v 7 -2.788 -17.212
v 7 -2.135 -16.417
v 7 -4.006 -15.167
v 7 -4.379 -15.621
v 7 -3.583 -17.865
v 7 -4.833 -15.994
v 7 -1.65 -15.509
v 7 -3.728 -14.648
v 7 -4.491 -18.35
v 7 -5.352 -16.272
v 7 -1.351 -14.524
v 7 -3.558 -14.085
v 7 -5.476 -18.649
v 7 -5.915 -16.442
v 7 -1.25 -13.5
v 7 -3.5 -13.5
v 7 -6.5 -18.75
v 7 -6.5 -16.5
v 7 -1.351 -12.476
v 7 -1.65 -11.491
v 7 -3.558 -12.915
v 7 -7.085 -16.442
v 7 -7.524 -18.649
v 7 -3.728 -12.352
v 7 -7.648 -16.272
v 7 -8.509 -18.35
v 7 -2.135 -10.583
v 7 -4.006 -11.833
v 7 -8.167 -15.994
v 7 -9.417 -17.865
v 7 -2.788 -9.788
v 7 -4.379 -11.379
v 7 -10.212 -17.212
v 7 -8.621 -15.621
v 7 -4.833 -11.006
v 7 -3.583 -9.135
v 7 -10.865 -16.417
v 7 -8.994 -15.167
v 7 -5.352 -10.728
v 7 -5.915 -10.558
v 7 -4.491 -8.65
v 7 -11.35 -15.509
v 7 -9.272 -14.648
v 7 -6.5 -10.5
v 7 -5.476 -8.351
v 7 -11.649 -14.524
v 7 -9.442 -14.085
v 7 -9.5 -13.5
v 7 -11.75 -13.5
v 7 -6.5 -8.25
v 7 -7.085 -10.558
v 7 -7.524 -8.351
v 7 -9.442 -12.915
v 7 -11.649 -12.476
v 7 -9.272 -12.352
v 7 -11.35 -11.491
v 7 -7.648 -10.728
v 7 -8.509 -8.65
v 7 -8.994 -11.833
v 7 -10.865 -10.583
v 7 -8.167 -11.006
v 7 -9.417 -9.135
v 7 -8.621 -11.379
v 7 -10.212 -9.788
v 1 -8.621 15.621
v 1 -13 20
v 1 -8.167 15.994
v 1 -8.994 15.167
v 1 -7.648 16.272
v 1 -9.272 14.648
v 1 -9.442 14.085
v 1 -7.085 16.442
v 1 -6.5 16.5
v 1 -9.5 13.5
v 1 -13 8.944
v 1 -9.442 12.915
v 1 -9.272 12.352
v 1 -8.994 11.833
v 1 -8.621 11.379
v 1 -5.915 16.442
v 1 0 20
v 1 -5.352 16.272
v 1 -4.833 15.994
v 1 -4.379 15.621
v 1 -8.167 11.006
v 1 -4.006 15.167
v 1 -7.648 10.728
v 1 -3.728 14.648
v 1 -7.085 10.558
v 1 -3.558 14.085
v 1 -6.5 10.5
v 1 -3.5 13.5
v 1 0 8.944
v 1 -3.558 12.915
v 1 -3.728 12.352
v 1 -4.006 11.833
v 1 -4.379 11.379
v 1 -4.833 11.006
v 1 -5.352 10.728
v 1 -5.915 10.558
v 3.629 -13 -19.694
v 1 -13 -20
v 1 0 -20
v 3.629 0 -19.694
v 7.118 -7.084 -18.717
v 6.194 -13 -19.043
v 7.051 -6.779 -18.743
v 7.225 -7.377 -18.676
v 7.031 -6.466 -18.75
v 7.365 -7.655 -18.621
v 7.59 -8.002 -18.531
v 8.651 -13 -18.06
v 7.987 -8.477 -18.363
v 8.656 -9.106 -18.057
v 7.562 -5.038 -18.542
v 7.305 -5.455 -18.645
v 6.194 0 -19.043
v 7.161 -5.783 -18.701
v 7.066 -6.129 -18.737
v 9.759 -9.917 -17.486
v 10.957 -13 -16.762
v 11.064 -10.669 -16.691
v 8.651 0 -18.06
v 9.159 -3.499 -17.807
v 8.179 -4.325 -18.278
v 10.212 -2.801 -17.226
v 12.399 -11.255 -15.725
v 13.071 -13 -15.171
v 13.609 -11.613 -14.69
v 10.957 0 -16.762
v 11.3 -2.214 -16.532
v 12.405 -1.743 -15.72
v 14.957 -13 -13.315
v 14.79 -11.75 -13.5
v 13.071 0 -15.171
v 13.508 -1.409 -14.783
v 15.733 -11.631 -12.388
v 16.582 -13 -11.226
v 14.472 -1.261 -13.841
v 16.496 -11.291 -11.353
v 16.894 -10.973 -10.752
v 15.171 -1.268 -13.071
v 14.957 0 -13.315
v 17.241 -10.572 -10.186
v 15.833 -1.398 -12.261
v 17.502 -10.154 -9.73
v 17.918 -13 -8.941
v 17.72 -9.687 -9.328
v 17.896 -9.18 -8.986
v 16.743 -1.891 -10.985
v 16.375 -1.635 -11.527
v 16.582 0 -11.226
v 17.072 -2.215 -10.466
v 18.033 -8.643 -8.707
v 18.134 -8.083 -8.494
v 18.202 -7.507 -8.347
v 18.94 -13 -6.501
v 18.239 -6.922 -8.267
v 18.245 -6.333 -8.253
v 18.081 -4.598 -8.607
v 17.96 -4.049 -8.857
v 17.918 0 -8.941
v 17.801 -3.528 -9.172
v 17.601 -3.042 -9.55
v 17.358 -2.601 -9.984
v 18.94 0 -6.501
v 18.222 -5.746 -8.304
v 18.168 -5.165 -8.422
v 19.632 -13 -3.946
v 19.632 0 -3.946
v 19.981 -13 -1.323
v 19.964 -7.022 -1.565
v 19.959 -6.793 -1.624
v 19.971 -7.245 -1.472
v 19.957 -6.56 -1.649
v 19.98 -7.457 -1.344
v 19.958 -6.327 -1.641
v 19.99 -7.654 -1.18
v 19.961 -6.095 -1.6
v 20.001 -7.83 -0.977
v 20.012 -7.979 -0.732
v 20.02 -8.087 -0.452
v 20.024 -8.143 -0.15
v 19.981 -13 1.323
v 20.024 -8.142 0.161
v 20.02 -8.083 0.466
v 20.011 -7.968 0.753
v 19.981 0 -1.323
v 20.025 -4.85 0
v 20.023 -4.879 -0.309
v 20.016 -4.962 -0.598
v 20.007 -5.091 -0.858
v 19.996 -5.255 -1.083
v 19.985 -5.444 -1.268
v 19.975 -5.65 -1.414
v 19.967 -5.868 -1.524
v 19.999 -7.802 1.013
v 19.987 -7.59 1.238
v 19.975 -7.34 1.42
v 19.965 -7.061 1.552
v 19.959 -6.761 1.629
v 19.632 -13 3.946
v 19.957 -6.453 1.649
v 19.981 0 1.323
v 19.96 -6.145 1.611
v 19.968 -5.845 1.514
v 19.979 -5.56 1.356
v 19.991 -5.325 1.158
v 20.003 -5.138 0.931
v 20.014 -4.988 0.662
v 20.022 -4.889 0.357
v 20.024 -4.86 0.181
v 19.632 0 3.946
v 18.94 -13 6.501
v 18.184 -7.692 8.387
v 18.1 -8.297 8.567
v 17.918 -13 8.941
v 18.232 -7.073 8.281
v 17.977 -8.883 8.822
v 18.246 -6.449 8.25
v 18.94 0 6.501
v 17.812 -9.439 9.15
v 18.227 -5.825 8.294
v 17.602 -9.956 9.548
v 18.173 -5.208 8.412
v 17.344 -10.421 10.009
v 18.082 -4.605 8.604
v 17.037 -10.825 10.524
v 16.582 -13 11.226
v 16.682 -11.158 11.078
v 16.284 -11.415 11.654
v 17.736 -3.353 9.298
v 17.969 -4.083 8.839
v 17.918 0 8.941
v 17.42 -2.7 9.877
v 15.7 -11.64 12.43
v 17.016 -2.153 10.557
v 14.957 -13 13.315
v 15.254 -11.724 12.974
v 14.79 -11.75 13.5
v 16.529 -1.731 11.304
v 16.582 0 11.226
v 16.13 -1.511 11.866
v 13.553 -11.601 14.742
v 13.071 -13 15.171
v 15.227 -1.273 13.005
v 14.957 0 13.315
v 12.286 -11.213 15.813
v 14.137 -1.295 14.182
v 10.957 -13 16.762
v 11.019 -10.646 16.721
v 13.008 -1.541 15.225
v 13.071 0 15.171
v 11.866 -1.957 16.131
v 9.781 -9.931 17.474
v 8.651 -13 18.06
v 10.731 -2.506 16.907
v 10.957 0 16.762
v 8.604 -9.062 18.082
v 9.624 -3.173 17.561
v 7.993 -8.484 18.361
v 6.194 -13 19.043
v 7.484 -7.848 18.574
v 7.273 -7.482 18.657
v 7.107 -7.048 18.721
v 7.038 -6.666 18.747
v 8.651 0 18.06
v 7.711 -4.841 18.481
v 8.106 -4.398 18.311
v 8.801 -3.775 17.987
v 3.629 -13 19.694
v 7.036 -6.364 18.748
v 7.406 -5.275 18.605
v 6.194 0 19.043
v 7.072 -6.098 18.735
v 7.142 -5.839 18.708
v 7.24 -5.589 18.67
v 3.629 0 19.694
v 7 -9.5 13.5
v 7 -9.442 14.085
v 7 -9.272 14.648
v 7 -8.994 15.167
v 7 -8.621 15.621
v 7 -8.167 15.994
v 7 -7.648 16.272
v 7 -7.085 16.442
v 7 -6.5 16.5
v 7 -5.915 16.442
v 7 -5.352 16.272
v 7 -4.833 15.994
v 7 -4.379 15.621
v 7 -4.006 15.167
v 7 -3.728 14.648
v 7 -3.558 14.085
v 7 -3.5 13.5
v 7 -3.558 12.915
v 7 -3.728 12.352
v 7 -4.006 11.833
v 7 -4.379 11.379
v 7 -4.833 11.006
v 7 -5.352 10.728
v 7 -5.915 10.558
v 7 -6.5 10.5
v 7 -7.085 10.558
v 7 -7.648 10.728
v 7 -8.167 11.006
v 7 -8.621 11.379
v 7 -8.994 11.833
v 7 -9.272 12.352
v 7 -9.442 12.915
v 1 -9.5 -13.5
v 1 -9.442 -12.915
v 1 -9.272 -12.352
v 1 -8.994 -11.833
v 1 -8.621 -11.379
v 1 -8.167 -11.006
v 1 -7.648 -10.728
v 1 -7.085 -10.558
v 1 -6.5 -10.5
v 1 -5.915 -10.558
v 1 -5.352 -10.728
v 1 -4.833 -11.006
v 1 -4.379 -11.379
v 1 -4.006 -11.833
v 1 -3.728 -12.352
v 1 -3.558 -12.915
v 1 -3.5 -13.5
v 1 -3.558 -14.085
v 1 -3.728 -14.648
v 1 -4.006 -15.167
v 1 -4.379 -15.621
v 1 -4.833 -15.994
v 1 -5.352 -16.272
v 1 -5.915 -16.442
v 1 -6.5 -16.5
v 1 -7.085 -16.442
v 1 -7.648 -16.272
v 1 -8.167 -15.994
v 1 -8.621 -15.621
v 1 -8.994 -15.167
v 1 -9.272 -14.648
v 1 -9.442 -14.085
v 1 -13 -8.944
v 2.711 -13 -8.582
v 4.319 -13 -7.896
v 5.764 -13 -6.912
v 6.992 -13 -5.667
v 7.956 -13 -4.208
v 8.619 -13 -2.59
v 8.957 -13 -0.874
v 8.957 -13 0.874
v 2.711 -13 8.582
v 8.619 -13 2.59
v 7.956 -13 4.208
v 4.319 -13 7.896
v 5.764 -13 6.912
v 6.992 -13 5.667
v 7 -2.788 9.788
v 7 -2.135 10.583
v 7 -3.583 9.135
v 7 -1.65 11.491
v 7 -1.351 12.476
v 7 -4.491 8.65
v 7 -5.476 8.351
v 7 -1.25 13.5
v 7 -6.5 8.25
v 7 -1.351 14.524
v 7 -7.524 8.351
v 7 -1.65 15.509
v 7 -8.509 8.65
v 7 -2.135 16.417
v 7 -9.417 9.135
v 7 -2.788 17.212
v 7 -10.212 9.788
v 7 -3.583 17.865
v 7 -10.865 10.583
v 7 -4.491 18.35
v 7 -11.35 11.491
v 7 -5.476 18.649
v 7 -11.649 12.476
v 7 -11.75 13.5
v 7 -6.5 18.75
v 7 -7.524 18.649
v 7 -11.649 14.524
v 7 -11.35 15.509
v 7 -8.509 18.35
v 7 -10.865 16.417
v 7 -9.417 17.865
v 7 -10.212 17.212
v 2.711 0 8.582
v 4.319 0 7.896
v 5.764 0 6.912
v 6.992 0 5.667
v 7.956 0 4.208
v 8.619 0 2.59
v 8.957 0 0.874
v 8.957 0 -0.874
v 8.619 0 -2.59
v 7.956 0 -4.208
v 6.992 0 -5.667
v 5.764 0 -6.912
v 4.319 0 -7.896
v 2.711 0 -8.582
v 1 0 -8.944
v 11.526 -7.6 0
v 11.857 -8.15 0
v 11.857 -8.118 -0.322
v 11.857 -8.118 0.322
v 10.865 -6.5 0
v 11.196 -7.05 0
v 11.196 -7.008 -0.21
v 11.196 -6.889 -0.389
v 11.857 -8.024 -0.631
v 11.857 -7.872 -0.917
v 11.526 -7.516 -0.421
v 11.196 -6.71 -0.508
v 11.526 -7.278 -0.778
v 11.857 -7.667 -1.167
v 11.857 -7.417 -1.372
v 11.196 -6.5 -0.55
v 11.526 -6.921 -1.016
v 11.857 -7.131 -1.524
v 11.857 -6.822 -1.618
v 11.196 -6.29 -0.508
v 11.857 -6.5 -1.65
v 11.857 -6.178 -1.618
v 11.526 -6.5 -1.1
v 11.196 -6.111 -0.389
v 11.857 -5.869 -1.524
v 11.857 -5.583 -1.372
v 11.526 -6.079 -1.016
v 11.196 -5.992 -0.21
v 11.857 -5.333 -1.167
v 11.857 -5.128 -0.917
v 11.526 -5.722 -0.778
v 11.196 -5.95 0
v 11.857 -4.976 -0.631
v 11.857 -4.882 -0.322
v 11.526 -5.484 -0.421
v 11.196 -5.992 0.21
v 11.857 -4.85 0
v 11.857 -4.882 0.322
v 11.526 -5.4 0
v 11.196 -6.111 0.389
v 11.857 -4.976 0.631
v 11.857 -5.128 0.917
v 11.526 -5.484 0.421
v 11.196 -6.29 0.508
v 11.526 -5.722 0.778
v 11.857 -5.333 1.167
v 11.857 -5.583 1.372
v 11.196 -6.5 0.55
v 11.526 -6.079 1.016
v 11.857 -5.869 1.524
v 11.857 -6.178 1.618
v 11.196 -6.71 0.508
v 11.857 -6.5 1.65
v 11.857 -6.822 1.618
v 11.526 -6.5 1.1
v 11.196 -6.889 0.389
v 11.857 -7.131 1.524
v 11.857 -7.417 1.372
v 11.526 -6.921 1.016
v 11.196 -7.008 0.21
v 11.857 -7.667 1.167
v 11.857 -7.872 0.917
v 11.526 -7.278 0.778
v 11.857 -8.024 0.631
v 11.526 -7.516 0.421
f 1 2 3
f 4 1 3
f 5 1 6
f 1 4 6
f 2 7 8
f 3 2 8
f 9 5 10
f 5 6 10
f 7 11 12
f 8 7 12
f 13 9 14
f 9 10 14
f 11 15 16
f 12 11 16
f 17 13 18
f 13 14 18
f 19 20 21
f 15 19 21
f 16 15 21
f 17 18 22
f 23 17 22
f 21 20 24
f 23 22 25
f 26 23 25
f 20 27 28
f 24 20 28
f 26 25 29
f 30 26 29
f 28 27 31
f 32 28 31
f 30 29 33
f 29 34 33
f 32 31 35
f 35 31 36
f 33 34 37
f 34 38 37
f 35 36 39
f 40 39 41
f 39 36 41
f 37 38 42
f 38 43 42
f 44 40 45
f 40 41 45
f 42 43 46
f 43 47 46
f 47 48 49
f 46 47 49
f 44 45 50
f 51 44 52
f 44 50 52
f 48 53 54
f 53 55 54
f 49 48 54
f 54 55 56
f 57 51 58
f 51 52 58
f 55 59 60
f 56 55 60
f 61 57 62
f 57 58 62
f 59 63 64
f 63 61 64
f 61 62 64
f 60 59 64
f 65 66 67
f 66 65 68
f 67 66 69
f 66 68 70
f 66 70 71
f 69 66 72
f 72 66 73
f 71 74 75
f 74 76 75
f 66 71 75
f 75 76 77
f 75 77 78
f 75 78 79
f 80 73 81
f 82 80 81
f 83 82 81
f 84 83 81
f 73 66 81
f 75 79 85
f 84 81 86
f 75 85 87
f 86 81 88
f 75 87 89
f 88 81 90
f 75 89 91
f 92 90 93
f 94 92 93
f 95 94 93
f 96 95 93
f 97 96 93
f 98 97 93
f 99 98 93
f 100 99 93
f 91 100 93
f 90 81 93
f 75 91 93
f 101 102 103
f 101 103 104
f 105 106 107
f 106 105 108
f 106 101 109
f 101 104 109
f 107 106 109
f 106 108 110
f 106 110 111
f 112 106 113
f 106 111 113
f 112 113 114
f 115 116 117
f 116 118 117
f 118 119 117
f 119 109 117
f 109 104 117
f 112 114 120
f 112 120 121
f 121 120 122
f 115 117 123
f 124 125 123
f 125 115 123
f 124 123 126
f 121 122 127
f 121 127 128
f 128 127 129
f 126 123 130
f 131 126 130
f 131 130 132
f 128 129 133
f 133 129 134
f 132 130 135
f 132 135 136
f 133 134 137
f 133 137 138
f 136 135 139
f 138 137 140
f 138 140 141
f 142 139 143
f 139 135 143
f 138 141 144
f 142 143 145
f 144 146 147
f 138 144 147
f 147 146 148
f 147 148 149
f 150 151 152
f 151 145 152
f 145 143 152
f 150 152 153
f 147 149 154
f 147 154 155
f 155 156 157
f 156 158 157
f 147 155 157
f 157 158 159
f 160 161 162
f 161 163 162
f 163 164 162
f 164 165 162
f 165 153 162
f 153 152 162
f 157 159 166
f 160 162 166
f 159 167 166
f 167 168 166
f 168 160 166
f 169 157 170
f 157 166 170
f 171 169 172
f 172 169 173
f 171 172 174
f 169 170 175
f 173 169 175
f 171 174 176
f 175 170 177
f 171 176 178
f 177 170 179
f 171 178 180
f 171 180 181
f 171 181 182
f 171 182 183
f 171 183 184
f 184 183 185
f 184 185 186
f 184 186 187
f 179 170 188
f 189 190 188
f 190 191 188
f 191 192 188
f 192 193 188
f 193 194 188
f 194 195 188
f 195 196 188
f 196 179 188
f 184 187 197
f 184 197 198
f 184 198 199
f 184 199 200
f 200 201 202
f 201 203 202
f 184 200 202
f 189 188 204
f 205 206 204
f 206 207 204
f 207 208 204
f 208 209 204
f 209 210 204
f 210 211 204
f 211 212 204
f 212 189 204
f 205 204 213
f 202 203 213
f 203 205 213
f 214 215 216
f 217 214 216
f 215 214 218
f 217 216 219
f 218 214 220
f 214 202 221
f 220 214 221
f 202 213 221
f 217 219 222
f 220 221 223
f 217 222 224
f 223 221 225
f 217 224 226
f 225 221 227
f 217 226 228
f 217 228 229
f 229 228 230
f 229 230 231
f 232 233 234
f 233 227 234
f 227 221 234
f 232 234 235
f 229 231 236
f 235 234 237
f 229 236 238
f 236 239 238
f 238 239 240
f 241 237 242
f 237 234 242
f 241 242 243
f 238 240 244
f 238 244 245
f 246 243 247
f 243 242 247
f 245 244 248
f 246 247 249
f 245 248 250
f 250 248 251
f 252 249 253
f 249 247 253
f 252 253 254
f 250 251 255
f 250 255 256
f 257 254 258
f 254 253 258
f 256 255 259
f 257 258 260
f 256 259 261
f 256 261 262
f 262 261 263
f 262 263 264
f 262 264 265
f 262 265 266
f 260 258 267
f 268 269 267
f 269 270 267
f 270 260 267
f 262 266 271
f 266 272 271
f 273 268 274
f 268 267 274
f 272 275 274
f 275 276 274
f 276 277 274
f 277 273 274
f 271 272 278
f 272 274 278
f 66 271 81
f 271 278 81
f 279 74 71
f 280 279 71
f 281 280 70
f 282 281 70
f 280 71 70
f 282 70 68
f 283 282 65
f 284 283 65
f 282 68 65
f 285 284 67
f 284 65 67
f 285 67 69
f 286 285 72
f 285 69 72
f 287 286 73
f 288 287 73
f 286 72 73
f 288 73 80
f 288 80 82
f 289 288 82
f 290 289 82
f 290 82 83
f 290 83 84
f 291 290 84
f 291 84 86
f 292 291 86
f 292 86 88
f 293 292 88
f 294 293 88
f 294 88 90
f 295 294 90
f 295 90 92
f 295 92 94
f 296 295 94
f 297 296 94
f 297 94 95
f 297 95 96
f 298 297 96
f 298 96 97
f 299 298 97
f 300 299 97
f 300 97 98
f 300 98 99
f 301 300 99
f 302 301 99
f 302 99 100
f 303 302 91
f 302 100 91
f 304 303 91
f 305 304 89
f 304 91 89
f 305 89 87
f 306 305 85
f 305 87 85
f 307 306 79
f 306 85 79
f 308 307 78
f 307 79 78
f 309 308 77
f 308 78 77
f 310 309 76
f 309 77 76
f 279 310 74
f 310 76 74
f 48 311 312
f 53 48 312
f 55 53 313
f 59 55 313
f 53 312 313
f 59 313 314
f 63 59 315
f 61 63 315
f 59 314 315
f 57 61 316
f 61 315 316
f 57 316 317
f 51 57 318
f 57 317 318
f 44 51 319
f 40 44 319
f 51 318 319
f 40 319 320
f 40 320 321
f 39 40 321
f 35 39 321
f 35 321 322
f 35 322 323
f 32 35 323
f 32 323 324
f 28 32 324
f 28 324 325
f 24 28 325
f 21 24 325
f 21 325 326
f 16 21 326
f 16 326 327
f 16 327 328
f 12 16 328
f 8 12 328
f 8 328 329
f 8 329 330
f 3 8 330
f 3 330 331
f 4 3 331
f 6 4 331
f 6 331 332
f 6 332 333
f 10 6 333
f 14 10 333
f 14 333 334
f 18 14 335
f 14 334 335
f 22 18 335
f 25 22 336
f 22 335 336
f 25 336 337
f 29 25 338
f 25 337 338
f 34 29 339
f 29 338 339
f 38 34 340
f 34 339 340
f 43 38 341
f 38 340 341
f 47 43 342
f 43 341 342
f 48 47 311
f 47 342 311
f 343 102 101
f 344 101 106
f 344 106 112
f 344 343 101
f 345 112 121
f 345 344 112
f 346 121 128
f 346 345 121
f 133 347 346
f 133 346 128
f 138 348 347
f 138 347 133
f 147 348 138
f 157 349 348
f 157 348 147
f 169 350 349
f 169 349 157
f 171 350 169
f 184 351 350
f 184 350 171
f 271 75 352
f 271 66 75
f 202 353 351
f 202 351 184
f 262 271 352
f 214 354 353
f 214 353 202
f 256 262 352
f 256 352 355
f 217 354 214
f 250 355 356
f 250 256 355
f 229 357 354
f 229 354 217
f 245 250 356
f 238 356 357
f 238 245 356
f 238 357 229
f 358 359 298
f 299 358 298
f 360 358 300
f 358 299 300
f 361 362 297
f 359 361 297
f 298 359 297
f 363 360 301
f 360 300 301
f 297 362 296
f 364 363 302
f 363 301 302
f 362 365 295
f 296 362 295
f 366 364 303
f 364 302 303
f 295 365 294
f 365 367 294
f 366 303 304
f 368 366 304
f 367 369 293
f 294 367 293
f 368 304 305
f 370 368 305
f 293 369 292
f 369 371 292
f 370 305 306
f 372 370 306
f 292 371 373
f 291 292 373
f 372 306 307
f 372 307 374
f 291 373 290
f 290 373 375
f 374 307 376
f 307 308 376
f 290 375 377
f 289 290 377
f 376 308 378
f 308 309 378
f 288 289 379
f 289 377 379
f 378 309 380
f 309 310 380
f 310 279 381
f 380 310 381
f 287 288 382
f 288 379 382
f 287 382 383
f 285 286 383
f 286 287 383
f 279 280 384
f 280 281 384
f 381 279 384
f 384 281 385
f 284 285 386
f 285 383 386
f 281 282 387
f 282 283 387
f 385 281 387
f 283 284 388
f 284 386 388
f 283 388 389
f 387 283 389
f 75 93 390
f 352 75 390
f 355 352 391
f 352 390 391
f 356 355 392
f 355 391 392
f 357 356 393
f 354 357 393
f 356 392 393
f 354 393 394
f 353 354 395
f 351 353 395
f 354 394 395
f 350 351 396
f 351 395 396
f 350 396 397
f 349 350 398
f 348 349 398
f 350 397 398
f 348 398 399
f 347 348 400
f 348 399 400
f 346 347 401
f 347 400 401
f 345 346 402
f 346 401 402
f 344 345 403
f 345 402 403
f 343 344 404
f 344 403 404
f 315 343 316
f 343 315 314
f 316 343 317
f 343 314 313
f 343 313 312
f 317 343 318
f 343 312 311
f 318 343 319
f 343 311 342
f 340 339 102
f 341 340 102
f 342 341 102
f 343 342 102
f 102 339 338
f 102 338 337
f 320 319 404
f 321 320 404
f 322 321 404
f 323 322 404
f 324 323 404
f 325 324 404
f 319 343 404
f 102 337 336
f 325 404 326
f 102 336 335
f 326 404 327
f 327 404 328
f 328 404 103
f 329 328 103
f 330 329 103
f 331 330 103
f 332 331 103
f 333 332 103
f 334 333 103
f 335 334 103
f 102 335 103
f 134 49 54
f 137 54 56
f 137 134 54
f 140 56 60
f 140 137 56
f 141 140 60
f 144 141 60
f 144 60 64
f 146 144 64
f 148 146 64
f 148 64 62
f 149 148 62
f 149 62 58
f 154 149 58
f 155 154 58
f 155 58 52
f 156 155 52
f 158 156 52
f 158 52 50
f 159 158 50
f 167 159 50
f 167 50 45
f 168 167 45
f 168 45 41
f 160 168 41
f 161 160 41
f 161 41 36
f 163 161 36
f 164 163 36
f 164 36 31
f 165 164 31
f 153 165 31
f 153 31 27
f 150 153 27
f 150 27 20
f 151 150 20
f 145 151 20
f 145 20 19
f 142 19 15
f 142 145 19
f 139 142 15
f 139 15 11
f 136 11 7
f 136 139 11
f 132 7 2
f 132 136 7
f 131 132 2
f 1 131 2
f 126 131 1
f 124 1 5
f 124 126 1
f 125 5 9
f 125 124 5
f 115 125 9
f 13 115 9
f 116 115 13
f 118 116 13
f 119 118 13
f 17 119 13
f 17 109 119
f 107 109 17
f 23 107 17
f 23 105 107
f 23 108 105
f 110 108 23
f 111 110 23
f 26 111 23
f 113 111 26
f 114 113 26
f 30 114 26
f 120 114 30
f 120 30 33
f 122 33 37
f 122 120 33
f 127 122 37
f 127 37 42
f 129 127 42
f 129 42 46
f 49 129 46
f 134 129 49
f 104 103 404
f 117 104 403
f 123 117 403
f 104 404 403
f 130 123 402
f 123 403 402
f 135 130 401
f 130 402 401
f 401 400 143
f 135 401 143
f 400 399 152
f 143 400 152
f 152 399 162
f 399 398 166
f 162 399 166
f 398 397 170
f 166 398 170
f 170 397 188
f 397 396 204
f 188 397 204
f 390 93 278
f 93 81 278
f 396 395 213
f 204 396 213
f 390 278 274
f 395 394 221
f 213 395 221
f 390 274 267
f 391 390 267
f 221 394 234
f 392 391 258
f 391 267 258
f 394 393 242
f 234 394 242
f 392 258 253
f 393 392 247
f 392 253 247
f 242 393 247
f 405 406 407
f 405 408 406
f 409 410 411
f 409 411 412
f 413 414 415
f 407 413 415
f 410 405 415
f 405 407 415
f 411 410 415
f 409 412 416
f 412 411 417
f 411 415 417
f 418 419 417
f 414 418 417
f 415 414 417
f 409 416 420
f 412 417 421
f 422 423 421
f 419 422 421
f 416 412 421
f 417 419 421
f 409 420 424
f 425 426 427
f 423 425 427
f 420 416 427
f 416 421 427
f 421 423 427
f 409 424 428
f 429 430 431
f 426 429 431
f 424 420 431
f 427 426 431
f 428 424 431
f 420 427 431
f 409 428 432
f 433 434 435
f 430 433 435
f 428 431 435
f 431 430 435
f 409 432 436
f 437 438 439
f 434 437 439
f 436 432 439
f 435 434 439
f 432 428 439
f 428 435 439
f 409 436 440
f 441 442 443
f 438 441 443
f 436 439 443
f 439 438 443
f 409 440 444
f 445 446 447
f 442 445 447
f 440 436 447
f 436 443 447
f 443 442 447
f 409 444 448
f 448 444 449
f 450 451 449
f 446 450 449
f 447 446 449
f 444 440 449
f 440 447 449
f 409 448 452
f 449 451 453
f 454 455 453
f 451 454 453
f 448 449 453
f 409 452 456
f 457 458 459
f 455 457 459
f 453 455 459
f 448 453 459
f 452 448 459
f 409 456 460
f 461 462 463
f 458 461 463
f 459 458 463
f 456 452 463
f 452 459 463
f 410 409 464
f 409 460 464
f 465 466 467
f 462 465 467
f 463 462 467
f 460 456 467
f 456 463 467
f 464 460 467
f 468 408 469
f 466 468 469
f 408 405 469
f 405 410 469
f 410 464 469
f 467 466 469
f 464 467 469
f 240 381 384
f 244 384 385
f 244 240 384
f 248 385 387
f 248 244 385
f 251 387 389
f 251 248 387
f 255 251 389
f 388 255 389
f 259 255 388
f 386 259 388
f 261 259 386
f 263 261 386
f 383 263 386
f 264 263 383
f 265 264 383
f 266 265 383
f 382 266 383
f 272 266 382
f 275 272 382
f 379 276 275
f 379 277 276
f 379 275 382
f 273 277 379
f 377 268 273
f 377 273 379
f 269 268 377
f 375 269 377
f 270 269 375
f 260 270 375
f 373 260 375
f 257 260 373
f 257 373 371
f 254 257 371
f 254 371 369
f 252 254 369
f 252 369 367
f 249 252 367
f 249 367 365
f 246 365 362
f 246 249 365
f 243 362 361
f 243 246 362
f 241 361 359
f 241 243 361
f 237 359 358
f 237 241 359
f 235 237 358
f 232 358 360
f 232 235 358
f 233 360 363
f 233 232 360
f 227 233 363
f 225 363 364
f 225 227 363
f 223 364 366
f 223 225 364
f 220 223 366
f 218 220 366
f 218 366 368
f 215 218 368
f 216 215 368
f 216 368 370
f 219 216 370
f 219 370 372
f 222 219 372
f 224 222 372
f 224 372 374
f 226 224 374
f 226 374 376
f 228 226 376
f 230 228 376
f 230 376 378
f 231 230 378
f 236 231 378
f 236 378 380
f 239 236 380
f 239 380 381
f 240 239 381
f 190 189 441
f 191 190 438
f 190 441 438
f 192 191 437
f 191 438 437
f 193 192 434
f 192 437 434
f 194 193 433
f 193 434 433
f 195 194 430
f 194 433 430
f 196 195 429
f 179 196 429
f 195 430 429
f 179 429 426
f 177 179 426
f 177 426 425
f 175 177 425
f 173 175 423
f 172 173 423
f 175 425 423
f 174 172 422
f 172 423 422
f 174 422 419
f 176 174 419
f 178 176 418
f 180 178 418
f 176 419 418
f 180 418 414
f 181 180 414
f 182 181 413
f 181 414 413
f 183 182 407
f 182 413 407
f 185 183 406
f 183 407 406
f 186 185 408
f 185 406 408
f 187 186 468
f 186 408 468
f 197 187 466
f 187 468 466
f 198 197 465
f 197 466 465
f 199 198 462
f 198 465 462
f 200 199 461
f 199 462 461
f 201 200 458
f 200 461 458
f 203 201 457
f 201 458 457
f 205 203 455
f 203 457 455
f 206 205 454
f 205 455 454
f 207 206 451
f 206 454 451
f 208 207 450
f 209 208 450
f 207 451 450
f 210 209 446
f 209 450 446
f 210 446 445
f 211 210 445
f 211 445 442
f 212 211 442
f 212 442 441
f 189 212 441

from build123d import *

# Parameters (mm, degrees)
F1_DEPTH = 13
F2_R     = 3
F3_DEPTH = 19.0259843945
F5_R     = 5.25
F6_DEPTH = 19
F9_D     = 3.3
F9_DEPTH = 8.1
F9_START = 1.0431091
F9_TIP   = 0.9914200214


with BuildPart() as f1:
    # F0 (on Front) → F1 (new body)
    with BuildSketch(Plane.XZ):
        with BuildLine():
            ThreePointArc((1, 8.94427191), (9, 0), (1, -8.94427191))
            Line((1, -8.94427191), (1, -20))
            ThreePointArc((1, -20), (20.0249843945, 0), (1, 20))
            Line((1, 20), (1, 8.94427191))
        make_face()
    extrude(amount=F1_DEPTH)

    # F2 (on face) → F3 (cut, through all)
    with BuildSketch(Plane(origin=(1, 0, 0), x_dir=(0, -1, 0), z_dir=(-1, 0, 0))):
        with Locations((6.5, 13.5)):
            Circle(F2_R)
        with Locations((6.5, -13.5)):
            Circle(F2_R)
    extrude(amount=-F3_DEPTH, mode=Mode.SUBTRACT)

    # F5 (on offset) → F6 (cut)
    with BuildSketch(Plane(origin=(26, 0, 0), x_dir=(0, -1, 0), z_dir=(-1, 0, 0))):
        with Locations((6.5, -13.5)):
            Circle(F5_R)
        with Locations((6.5, 13.5)):
            Circle(F5_R)
    extrude(amount=F6_DEPTH, mode=Mode.SUBTRACT)

    # F9
    # its depths count from where the whole tool has entered the part; down to there all is cleared
    with Locations(Plane(origin=(21, 0, 0), x_dir=(0, -1, 0), z_dir=(1, 0, 0)).offset(-F9_START)):
        with Locations((6.5, 0)):
            Hole(F9_D / 2, depth=F9_DEPTH)
            with Locations((0, 0, -(F9_DEPTH + F9_TIP / 2))):  # 118° drill point
                Cone(0, F9_D / 2, F9_TIP, mode=Mode.SUBTRACT)


solid = f1.part
